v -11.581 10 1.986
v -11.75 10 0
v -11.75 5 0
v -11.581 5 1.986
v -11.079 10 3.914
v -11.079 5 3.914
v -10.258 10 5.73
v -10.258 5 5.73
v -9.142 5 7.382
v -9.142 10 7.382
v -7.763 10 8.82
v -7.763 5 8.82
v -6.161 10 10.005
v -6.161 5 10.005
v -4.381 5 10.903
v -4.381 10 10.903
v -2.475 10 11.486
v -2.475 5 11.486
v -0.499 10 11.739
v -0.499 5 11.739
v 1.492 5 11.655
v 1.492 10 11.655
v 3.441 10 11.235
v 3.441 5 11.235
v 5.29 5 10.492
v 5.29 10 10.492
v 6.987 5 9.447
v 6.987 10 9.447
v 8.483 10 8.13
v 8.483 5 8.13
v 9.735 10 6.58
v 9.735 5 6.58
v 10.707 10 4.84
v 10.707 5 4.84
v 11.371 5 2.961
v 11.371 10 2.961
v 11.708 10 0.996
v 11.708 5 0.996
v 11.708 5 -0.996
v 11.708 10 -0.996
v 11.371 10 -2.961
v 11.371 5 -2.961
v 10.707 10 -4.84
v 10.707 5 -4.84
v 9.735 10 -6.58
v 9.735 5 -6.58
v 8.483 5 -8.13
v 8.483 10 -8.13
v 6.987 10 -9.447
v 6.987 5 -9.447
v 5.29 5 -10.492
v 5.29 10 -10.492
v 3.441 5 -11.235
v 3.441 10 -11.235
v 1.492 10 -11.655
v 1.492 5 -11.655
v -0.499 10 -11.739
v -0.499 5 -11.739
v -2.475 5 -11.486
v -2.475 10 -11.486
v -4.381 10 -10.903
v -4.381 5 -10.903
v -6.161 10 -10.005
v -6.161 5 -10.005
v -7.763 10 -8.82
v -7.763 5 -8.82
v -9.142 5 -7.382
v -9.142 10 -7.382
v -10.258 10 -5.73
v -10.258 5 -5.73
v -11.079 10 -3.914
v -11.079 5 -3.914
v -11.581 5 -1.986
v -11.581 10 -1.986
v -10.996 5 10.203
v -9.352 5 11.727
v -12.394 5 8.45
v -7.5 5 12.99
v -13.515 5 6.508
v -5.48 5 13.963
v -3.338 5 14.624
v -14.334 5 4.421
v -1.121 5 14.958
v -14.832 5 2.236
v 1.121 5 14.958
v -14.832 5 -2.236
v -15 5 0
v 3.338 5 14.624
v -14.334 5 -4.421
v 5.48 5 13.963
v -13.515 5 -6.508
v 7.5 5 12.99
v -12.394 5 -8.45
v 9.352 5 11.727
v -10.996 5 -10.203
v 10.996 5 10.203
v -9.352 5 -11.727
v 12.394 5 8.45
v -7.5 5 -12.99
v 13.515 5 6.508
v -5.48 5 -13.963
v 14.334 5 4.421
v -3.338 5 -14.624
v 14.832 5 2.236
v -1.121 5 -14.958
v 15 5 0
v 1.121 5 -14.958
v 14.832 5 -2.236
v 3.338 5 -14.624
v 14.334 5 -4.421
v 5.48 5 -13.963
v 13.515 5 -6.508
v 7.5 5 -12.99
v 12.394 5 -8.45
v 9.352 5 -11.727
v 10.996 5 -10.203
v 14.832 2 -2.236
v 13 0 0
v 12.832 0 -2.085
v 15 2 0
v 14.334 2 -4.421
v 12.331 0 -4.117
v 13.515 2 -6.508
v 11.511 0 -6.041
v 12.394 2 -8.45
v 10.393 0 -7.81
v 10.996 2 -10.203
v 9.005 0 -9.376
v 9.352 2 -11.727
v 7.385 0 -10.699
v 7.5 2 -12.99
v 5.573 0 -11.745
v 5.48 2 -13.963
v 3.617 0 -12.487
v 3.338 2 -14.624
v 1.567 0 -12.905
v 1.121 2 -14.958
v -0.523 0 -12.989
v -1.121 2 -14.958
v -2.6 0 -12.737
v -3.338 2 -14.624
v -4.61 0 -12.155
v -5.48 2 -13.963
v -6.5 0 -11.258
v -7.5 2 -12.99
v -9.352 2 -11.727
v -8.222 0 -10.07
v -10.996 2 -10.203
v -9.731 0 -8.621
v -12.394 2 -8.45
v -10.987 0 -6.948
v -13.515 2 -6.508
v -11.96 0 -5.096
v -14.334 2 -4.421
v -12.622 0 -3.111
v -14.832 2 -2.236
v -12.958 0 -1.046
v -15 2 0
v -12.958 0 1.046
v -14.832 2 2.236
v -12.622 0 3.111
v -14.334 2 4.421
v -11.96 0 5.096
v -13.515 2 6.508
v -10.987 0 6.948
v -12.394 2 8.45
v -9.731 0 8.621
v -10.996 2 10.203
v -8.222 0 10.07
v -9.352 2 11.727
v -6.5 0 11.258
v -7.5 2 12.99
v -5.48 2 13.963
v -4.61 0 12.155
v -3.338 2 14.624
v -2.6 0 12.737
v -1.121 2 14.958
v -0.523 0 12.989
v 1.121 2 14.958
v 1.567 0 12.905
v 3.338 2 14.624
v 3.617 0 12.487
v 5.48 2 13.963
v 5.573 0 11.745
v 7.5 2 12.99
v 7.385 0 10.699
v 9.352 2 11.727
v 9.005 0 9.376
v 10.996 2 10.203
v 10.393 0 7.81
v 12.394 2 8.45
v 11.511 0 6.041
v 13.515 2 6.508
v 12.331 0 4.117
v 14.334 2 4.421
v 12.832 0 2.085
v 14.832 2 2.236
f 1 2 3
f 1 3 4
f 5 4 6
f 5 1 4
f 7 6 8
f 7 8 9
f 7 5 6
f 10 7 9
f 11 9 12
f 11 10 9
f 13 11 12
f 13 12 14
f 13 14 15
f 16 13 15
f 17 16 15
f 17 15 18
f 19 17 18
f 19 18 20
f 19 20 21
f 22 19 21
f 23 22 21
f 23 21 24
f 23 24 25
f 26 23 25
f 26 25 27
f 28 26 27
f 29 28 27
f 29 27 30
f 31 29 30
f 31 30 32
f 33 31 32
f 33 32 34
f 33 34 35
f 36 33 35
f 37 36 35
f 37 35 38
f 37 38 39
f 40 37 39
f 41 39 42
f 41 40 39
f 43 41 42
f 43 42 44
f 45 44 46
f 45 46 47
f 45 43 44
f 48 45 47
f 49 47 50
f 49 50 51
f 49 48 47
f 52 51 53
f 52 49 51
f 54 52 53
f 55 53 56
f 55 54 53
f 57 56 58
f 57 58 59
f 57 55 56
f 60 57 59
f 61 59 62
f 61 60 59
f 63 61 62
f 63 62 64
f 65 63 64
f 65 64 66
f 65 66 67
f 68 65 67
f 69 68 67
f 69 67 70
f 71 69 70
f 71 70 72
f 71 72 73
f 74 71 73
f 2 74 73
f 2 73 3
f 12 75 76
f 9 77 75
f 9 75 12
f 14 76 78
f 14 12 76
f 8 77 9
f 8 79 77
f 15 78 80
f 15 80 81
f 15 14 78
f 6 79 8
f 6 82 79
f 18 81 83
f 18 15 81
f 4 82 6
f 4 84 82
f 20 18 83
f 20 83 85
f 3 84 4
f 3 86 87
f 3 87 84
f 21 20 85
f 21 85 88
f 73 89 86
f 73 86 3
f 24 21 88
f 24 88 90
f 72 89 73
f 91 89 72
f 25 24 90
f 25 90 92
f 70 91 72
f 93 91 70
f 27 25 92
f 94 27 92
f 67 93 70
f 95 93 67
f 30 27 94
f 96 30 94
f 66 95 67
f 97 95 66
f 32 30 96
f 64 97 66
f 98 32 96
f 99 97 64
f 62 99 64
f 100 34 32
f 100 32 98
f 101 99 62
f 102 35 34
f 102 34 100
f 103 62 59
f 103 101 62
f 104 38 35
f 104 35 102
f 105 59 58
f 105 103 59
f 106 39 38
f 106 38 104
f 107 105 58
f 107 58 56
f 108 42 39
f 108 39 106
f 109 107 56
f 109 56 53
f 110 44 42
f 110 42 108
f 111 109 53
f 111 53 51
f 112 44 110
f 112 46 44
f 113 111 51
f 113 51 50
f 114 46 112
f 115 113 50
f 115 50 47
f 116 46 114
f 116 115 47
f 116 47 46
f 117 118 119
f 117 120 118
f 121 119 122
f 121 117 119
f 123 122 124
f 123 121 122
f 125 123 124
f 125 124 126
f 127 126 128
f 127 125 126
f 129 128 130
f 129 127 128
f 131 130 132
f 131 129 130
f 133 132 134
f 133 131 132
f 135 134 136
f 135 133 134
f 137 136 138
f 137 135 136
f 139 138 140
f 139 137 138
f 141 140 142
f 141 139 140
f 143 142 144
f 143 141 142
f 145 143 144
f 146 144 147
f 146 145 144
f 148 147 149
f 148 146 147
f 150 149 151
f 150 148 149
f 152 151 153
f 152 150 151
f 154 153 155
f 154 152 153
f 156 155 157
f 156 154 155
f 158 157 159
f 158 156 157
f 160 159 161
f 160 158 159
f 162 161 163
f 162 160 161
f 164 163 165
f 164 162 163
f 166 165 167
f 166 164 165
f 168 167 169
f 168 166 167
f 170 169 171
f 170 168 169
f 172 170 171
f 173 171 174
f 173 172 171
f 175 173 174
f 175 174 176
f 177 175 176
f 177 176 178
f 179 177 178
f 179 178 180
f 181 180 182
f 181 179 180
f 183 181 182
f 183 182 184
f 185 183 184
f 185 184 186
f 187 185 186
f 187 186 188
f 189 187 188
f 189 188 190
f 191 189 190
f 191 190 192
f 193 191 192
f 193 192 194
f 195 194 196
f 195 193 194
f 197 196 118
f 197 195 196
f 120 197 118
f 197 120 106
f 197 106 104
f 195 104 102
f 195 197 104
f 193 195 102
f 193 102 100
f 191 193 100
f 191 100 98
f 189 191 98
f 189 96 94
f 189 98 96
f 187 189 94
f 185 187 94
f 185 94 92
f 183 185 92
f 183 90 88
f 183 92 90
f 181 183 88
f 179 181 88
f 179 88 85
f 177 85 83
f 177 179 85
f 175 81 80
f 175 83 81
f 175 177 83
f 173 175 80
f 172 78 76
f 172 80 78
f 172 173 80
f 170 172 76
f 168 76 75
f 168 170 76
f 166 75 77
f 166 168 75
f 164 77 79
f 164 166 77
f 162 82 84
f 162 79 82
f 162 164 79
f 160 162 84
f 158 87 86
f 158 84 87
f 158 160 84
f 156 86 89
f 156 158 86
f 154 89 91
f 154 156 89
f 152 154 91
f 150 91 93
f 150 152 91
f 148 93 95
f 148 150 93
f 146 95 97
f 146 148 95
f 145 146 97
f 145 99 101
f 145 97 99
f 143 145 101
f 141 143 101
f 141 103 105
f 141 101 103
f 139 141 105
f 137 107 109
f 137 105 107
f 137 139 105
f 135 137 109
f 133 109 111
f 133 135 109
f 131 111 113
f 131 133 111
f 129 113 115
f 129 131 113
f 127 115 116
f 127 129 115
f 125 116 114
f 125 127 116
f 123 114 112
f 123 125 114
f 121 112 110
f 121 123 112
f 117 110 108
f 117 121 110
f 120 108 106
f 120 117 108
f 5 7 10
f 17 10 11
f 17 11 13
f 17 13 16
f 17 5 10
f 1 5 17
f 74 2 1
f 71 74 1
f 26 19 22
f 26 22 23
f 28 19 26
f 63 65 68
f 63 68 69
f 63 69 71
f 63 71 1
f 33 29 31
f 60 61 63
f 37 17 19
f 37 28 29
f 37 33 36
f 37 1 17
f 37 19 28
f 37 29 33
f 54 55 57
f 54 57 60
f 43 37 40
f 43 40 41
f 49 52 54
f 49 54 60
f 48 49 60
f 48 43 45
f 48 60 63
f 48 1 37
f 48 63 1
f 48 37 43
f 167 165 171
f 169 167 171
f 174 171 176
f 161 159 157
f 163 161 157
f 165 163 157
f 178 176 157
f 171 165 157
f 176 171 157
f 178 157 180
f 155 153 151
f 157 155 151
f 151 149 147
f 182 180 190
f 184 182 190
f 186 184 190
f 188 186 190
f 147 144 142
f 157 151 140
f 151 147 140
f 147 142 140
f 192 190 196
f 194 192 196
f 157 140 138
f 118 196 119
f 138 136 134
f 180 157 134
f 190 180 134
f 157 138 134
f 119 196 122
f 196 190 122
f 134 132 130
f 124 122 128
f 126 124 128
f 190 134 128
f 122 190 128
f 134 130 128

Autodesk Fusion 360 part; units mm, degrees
sketch "Skizze1" plane through (0, 0, 0) normal (0, 1, 0) x (1, 0, 0)
  circle A0 centre (0, 0) radius 12
  circle A1 centre (0, 0) radius 15
  dimension "d1" = 24
  dimension "d2" = 30
extrude "Extrusion1" add sketch "Skizze1" along normal blind 5
extrude "Extrusion2" add sketch "Skizze1" along normal blind 10 contours A0
chamfer "Fase1" distance 2 angle 45 1 edges at (-13.9849, 0, 5.4242)
sketch "Skizze2" plane through (0, 10, 0) normal (0, 1, 0) x (-1, 0, 0)
  circle A0 centre (0, 0) radius 12
  circle A1 centre (0, 0) radius 12
  circle A2 centre (0, 0) radius 11.75
  dimension "d8" = 23.5
extrude "Extrusion3" cut sketch "Skizze2" against normal blind 5
